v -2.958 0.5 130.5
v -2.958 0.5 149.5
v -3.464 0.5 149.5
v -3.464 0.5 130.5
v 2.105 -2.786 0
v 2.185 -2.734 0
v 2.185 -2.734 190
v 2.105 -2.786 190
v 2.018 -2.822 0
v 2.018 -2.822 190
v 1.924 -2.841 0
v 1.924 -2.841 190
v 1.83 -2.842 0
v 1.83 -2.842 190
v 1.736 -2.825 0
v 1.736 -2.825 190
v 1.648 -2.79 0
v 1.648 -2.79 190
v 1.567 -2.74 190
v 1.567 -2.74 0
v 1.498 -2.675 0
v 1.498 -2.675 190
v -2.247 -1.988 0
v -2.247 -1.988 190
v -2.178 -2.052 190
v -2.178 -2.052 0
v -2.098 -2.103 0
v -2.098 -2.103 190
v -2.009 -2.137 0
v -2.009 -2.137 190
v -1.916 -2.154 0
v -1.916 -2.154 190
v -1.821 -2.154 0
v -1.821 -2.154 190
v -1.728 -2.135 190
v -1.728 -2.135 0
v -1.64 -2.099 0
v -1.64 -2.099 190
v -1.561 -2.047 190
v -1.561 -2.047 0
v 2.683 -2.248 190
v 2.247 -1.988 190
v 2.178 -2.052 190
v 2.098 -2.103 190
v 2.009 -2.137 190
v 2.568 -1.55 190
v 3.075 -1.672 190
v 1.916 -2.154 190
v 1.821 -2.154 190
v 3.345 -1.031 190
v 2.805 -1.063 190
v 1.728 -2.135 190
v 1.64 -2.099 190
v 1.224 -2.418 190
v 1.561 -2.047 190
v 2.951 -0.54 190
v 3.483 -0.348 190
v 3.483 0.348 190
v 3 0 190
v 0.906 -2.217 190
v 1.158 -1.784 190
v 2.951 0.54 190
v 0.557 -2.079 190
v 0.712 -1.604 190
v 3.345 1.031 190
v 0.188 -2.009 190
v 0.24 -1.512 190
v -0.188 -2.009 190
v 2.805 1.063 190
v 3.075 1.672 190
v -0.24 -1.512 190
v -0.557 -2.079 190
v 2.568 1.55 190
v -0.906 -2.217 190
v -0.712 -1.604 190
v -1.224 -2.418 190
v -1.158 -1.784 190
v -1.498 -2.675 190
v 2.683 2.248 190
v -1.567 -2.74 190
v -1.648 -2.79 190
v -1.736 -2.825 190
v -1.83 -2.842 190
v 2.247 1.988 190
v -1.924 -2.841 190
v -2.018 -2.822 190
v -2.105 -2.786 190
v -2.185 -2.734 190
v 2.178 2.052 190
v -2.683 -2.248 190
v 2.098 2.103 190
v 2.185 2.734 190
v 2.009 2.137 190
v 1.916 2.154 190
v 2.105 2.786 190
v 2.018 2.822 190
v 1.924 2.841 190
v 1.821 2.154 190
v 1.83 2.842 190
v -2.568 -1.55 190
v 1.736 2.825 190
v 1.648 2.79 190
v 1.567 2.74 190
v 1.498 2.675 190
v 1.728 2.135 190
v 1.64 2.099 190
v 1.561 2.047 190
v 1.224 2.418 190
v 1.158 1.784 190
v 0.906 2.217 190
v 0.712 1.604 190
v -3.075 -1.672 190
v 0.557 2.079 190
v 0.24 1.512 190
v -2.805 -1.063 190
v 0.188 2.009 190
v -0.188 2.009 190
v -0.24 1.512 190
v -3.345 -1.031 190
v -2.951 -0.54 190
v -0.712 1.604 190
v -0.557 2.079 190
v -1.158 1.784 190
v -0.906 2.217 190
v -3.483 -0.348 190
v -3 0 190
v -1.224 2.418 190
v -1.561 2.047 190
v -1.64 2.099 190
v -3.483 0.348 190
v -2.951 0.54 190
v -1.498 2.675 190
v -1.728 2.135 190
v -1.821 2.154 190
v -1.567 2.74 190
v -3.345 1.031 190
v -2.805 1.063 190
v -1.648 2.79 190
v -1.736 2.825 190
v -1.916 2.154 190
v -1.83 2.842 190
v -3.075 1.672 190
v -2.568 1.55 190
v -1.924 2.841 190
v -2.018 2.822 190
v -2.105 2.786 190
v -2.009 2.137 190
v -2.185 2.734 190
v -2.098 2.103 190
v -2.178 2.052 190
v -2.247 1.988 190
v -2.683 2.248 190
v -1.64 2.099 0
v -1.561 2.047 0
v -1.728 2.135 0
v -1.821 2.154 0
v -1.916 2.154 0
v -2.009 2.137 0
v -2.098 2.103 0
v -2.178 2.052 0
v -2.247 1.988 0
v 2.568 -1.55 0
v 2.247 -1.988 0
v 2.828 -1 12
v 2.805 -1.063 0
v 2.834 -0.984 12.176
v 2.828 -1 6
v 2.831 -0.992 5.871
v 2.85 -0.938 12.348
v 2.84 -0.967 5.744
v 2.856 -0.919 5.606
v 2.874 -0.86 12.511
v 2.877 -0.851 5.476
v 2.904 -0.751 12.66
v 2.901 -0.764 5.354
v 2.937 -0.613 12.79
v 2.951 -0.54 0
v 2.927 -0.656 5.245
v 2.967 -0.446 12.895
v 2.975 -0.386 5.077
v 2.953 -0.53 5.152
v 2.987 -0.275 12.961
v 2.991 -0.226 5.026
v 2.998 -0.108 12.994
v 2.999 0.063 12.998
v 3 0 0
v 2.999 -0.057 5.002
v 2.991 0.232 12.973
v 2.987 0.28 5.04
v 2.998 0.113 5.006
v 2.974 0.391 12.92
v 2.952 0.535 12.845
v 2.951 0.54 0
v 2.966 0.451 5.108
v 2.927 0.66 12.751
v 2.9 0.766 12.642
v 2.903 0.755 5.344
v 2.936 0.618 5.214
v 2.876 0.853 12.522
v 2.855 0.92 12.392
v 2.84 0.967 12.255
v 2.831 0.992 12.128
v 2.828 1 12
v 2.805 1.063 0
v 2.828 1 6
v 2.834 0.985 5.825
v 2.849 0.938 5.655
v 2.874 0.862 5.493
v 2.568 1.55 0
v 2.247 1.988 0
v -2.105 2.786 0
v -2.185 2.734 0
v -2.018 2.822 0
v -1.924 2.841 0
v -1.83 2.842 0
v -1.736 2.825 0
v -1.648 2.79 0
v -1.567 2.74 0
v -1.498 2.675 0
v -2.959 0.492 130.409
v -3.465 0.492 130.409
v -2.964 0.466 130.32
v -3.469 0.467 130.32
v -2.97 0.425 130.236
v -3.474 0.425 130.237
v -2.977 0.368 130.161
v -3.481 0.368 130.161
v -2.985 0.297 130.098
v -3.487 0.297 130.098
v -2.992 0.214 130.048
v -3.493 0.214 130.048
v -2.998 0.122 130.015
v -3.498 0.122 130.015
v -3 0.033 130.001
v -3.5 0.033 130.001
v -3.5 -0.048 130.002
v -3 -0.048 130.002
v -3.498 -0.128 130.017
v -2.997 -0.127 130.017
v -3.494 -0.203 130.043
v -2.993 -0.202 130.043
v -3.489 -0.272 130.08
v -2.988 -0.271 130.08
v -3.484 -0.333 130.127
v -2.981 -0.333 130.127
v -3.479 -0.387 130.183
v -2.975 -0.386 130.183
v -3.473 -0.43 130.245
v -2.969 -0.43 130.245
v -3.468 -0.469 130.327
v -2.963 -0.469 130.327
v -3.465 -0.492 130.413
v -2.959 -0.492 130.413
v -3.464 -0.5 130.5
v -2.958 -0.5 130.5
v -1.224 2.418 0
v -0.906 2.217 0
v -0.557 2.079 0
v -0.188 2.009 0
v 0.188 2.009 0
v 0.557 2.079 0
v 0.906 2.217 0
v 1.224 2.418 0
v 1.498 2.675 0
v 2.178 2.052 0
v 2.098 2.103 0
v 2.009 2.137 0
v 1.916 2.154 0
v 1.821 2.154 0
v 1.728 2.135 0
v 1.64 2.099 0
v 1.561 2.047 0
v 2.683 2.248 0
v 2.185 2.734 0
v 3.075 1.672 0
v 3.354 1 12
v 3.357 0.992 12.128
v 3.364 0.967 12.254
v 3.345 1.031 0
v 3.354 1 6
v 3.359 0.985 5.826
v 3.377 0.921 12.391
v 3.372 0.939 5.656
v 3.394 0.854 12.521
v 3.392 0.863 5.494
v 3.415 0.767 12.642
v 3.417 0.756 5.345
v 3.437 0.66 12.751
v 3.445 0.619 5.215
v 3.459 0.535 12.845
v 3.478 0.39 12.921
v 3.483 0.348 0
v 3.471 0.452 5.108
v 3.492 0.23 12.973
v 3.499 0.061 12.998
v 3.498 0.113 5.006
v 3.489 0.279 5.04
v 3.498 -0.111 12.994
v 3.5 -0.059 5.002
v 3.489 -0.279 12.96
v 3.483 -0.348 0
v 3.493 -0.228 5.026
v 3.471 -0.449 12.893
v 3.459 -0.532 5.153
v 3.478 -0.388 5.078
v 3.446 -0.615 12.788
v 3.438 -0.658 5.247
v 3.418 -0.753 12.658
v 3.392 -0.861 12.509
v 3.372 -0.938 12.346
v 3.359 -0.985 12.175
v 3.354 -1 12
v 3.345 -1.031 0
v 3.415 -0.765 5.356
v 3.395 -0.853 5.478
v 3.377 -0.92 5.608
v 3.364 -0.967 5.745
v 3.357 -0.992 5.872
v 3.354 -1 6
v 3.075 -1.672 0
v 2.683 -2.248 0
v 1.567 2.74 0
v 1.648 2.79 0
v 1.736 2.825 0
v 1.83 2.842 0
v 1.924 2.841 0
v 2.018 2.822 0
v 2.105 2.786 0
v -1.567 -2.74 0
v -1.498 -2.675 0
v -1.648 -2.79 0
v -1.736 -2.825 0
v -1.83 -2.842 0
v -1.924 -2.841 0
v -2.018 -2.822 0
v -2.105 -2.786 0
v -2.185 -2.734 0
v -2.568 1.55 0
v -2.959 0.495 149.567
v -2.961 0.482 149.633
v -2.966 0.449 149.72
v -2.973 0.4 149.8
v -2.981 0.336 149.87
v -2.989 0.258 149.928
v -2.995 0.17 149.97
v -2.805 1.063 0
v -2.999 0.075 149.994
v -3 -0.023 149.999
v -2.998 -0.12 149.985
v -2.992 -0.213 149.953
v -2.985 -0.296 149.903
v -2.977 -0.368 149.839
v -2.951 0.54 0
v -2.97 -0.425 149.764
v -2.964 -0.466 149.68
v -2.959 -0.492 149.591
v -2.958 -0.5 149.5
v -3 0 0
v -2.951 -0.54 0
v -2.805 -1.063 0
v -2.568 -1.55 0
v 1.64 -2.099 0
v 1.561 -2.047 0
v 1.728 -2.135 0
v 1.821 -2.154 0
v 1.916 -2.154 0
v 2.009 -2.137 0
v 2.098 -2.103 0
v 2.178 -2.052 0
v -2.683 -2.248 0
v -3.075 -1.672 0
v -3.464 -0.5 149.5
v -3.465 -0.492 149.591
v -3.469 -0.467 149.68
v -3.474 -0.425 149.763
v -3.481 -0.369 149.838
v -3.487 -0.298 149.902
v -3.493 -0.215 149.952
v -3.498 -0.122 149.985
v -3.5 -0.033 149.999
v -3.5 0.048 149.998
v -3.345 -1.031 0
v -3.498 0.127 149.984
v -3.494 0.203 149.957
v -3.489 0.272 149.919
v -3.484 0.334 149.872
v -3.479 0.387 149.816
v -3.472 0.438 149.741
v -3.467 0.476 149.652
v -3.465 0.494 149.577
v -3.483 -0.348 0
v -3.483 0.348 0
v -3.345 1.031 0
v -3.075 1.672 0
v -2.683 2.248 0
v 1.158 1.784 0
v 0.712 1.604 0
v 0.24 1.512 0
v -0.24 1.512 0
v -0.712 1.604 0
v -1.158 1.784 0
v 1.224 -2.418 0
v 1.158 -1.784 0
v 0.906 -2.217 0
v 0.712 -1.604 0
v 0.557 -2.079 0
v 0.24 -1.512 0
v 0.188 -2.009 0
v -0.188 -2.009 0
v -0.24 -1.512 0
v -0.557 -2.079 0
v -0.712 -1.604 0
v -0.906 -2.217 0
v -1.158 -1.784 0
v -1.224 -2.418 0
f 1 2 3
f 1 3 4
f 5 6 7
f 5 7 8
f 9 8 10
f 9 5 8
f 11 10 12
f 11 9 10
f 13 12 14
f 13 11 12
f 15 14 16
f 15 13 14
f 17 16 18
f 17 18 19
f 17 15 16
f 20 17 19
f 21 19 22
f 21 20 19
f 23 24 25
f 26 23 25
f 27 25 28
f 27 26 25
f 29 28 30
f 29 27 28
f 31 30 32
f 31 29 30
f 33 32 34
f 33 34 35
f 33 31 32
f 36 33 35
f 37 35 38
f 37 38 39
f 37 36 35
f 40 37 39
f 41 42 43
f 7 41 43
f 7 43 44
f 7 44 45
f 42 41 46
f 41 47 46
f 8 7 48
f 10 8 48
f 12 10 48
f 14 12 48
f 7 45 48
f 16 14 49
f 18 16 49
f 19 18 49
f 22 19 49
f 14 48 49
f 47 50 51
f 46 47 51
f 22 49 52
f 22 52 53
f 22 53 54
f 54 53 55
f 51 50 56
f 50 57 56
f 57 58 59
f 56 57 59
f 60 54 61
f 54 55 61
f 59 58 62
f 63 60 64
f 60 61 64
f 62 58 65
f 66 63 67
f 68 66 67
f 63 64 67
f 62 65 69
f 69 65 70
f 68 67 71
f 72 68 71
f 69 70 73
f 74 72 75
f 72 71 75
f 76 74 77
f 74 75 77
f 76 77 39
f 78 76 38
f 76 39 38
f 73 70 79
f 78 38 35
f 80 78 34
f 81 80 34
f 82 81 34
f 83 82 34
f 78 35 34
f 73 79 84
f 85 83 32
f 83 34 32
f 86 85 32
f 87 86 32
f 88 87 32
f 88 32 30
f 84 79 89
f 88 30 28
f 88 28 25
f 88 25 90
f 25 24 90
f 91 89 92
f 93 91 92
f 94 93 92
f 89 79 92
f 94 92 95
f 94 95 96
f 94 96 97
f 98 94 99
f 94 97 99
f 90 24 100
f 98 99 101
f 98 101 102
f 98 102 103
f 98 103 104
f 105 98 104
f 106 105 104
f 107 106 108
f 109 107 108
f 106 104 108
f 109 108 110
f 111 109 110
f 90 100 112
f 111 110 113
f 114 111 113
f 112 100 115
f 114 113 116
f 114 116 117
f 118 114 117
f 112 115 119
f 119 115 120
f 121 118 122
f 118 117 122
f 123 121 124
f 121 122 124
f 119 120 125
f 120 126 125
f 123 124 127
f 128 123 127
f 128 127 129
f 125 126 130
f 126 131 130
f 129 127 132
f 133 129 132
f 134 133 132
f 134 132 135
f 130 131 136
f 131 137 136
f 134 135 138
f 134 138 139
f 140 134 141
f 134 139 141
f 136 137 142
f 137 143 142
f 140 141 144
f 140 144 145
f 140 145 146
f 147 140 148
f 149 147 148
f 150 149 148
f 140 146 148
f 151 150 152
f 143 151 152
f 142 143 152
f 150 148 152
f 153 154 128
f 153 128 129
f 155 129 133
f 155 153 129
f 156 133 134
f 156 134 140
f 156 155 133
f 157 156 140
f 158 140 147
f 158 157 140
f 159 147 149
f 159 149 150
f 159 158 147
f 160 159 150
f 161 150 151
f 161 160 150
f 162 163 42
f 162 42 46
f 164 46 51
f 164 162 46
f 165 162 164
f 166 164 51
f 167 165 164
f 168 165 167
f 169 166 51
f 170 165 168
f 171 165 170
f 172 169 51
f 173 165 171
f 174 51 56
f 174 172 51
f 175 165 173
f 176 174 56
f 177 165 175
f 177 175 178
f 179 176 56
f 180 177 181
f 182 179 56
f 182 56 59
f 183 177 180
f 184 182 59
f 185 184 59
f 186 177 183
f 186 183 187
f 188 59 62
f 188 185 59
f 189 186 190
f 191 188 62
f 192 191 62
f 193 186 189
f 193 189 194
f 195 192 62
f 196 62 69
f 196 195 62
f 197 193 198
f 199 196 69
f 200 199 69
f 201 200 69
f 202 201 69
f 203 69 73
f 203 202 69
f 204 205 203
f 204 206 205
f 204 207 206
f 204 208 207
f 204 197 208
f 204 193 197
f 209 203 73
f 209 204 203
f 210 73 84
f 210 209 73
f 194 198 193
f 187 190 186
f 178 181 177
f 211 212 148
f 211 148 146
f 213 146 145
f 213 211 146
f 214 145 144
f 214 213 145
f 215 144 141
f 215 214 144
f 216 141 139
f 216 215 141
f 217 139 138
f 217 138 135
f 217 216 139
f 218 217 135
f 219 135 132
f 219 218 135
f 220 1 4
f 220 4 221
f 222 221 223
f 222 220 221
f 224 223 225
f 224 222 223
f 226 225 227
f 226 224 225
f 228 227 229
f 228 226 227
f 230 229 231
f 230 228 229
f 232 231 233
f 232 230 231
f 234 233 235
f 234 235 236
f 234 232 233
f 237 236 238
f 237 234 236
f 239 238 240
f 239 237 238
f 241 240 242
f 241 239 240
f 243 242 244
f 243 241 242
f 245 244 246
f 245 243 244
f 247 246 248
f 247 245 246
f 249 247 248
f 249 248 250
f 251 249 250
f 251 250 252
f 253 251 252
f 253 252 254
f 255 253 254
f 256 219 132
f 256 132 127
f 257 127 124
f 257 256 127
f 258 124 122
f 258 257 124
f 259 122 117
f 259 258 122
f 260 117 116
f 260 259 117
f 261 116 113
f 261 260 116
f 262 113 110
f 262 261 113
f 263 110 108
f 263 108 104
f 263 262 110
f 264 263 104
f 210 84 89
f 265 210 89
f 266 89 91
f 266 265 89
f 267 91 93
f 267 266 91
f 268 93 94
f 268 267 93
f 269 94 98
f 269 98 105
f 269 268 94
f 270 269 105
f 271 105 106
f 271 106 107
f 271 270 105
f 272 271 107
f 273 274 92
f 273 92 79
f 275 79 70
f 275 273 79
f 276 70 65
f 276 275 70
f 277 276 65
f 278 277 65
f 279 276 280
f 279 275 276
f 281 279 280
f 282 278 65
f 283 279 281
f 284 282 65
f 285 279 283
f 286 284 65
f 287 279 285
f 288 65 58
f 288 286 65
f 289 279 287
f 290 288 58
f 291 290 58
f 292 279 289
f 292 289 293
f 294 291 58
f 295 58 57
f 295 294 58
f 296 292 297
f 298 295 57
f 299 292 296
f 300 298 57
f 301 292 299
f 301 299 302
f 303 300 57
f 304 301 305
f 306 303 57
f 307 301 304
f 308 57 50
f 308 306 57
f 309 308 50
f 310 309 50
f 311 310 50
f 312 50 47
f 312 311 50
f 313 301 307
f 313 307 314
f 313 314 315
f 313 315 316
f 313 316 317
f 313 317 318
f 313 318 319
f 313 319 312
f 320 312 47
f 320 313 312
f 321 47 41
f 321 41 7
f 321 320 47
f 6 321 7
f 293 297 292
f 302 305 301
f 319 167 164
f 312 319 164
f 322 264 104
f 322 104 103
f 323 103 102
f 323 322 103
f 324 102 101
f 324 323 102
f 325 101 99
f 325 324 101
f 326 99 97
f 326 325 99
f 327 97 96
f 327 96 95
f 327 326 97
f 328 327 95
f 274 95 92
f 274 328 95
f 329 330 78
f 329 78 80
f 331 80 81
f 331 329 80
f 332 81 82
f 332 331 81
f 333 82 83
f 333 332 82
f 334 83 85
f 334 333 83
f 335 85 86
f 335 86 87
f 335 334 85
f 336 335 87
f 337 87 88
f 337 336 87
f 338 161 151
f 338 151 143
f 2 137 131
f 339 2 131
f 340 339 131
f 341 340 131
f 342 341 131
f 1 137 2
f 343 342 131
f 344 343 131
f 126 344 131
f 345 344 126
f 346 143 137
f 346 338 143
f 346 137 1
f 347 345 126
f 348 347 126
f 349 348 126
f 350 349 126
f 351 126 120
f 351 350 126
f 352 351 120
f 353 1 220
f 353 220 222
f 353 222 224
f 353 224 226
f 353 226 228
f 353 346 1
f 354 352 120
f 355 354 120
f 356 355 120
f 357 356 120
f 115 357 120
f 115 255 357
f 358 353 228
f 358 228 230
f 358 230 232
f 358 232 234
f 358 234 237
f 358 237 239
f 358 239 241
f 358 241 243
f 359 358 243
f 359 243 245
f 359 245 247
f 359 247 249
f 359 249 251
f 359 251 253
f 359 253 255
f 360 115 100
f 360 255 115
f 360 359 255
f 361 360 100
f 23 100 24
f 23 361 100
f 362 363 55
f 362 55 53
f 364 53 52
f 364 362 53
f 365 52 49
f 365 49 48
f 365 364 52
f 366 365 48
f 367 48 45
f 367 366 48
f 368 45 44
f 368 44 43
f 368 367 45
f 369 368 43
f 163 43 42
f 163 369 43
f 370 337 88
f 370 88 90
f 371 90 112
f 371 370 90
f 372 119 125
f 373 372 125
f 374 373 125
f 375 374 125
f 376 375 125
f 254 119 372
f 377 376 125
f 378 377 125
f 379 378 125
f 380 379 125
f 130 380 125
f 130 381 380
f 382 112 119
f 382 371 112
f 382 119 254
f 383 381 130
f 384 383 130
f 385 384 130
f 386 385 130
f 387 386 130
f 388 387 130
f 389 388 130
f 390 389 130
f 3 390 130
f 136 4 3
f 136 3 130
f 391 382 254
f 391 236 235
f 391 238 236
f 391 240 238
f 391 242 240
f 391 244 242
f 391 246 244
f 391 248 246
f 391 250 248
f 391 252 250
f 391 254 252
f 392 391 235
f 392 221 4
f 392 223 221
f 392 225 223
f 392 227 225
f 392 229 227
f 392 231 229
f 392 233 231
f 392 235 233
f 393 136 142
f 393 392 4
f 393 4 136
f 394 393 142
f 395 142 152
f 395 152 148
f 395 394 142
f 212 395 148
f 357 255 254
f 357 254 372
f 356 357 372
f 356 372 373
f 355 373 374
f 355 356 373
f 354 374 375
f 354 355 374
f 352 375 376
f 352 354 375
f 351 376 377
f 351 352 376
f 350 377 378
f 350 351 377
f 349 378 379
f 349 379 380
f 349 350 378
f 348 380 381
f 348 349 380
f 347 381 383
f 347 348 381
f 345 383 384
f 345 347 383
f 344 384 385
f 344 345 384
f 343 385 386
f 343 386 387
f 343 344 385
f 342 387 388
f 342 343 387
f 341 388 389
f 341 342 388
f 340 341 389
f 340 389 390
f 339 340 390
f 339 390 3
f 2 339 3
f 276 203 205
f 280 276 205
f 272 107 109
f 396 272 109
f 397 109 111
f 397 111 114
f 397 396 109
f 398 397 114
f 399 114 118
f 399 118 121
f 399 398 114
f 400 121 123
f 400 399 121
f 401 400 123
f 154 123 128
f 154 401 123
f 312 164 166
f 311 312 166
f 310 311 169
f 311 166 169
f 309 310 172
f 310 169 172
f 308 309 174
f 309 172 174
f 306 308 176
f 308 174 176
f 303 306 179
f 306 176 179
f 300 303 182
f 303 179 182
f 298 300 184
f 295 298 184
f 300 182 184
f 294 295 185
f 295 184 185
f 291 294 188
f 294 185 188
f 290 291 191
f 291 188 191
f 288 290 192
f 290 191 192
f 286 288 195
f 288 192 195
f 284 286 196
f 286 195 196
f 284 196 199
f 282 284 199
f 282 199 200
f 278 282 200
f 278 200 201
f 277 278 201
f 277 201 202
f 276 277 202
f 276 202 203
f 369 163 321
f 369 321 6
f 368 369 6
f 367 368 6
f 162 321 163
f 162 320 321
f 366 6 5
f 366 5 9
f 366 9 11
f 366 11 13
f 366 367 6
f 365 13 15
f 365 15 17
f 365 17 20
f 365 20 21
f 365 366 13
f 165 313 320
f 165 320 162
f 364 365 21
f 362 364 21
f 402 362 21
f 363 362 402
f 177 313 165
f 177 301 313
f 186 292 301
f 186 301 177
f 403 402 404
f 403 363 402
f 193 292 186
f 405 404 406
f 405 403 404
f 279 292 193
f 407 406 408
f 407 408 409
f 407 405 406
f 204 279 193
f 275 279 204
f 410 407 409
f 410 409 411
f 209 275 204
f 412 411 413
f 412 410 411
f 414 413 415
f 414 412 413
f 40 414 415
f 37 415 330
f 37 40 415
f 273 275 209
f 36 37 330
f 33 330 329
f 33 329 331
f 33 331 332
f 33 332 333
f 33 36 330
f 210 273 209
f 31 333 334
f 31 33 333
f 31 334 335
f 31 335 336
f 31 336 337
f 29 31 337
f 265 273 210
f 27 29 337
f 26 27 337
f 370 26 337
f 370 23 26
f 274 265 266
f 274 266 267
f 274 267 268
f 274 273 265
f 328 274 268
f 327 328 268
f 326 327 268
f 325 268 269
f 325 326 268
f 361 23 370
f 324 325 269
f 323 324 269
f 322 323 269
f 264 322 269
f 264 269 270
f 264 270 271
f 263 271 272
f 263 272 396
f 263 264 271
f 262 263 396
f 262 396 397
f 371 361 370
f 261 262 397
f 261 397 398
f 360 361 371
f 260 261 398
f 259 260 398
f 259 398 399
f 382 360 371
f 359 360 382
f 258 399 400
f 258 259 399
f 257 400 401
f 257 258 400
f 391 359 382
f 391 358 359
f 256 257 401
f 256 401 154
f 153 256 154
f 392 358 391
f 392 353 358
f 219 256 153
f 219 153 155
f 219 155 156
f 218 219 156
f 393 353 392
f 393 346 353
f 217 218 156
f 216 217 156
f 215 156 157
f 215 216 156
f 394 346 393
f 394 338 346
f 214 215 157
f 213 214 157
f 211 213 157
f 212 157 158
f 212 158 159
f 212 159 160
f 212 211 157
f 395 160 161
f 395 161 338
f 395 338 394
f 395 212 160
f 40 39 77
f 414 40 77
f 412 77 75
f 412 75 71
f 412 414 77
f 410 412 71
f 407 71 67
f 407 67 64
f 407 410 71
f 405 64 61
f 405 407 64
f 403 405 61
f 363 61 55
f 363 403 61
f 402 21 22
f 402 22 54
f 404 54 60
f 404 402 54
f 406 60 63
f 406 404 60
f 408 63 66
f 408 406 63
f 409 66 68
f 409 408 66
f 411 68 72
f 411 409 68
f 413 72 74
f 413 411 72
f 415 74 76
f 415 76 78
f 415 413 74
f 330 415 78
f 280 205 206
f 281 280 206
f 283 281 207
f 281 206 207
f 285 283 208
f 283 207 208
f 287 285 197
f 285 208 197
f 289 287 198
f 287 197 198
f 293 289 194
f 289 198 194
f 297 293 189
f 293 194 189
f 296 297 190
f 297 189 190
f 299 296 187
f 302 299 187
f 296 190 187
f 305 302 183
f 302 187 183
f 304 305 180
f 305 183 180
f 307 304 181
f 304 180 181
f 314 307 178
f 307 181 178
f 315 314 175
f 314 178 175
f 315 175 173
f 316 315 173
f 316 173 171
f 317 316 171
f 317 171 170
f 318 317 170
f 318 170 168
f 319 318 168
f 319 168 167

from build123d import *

# Parameters (mm, degrees)
ESTRUSIONE_ESTRUSIONE1_DEPTH = 190
TAGLIO_ESTRUSIONE1_DEPTH     = 190
TAGLIO_ESTRUSIONE2_DEPTH     = 191.053510761


with BuildPart() as part:
    # Schizzo1 → Estrusione-Estrusione1 (new body)
    with BuildSketch(Plane.XY):
        with BuildLine():
            ThreePointArc((2.184763914, -2.734375), (1.829579631, -2.841891076), (1.498123827, -2.675))
            ThreePointArc((1.498123827, -2.675), (0, -2), (-1.498123827, -2.675))
            ThreePointArc((-1.498123827, -2.675), (-1.829579631, -2.841891076), (-2.184763914, -2.734375))
            ThreePointArc((-2.184763914, -2.734375), (-3.5, 0), (-2.184763914, 2.734375))
            ThreePointArc((-2.184763914, 2.734375), (-1.829579631, 2.841891076), (-1.498123827, 2.675))
            ThreePointArc((-1.498123827, 2.675), (0, 2), (1.498123827, 2.675))
            ThreePointArc((1.498123827, 2.675), (1.829579631, 2.841891076), (2.184763914, 2.734375))
            ThreePointArc((2.184763914, 2.734375), (3.5, 0), (2.184763914, -2.734375))
        make_face()
        with BuildLine():
            ThreePointArc((-2.24718574, 1.9875), (-3, 0), (-2.24718574, -1.9875))
            ThreePointArc((-2.24718574, -1.9875), (-1.915729936, -2.154391076), (-1.560545653, -2.046875))
            ThreePointArc((-1.560545653, -2.046875), (0, -1.5), (1.560545653, -2.046875))
            ThreePointArc((1.560545653, -2.046875), (1.915729936, -2.154391076), (2.24718574, -1.9875))
            ThreePointArc((2.24718574, -1.9875), (3, 0), (2.24718574, 1.9875))
            ThreePointArc((2.24718574, 1.9875), (1.915729936, 2.154391076), (1.560545653, 2.046875))
            ThreePointArc((1.560545653, 2.046875), (0, 1.5), (-1.560545653, 2.046875))
            ThreePointArc((-1.560545653, 2.046875), (-1.915729936, 2.154391076), (-2.24718574, 1.9875))
        make_face(mode=Mode.SUBTRACT)
    extrude(amount=ESTRUSIONE_ESTRUSIONE1_DEPTH)

    # Schizzo2 → Taglio-Estrusione1 (cut)
    with BuildSketch(Plane(origin=(0, 0, 0), x_dir=(0, 0, -1), z_dir=(1, 0, 0))):
        with BuildLine():
            Line((-149.5, 0.5), (-130.5, 0.5))
            ThreePointArc((-130.5, 0.5), (-130, 0), (-130.5, -0.5))
            Line((-130.5, -0.5), (-149.5, -0.5))
            ThreePointArc((-149.5, -0.5), (-150, 0), (-149.5, 0.5))
        make_face()
    extrude(amount=-TAGLIO_ESTRUSIONE1_DEPTH, mode=Mode.SUBTRACT)

    # Schizzo3 → Taglio-Estrusione2 (cut, through all)
    with BuildSketch(Plane(origin=(0, 0, 0), x_dir=(0, 0, -1), z_dir=(1, 0, 0))):
        with BuildLine():
            Line((-12, 1), (-6, 1))
            ThreePointArc((-6, 1), (-5, 0), (-6, -1))
            Line((-6, -1), (-12, -1))
            ThreePointArc((-12, -1), (-13, 0), (-12, 1))
        make_face()
    extrude(amount=TAGLIO_ESTRUSIONE2_DEPTH, mode=Mode.SUBTRACT)


solid = part.part
